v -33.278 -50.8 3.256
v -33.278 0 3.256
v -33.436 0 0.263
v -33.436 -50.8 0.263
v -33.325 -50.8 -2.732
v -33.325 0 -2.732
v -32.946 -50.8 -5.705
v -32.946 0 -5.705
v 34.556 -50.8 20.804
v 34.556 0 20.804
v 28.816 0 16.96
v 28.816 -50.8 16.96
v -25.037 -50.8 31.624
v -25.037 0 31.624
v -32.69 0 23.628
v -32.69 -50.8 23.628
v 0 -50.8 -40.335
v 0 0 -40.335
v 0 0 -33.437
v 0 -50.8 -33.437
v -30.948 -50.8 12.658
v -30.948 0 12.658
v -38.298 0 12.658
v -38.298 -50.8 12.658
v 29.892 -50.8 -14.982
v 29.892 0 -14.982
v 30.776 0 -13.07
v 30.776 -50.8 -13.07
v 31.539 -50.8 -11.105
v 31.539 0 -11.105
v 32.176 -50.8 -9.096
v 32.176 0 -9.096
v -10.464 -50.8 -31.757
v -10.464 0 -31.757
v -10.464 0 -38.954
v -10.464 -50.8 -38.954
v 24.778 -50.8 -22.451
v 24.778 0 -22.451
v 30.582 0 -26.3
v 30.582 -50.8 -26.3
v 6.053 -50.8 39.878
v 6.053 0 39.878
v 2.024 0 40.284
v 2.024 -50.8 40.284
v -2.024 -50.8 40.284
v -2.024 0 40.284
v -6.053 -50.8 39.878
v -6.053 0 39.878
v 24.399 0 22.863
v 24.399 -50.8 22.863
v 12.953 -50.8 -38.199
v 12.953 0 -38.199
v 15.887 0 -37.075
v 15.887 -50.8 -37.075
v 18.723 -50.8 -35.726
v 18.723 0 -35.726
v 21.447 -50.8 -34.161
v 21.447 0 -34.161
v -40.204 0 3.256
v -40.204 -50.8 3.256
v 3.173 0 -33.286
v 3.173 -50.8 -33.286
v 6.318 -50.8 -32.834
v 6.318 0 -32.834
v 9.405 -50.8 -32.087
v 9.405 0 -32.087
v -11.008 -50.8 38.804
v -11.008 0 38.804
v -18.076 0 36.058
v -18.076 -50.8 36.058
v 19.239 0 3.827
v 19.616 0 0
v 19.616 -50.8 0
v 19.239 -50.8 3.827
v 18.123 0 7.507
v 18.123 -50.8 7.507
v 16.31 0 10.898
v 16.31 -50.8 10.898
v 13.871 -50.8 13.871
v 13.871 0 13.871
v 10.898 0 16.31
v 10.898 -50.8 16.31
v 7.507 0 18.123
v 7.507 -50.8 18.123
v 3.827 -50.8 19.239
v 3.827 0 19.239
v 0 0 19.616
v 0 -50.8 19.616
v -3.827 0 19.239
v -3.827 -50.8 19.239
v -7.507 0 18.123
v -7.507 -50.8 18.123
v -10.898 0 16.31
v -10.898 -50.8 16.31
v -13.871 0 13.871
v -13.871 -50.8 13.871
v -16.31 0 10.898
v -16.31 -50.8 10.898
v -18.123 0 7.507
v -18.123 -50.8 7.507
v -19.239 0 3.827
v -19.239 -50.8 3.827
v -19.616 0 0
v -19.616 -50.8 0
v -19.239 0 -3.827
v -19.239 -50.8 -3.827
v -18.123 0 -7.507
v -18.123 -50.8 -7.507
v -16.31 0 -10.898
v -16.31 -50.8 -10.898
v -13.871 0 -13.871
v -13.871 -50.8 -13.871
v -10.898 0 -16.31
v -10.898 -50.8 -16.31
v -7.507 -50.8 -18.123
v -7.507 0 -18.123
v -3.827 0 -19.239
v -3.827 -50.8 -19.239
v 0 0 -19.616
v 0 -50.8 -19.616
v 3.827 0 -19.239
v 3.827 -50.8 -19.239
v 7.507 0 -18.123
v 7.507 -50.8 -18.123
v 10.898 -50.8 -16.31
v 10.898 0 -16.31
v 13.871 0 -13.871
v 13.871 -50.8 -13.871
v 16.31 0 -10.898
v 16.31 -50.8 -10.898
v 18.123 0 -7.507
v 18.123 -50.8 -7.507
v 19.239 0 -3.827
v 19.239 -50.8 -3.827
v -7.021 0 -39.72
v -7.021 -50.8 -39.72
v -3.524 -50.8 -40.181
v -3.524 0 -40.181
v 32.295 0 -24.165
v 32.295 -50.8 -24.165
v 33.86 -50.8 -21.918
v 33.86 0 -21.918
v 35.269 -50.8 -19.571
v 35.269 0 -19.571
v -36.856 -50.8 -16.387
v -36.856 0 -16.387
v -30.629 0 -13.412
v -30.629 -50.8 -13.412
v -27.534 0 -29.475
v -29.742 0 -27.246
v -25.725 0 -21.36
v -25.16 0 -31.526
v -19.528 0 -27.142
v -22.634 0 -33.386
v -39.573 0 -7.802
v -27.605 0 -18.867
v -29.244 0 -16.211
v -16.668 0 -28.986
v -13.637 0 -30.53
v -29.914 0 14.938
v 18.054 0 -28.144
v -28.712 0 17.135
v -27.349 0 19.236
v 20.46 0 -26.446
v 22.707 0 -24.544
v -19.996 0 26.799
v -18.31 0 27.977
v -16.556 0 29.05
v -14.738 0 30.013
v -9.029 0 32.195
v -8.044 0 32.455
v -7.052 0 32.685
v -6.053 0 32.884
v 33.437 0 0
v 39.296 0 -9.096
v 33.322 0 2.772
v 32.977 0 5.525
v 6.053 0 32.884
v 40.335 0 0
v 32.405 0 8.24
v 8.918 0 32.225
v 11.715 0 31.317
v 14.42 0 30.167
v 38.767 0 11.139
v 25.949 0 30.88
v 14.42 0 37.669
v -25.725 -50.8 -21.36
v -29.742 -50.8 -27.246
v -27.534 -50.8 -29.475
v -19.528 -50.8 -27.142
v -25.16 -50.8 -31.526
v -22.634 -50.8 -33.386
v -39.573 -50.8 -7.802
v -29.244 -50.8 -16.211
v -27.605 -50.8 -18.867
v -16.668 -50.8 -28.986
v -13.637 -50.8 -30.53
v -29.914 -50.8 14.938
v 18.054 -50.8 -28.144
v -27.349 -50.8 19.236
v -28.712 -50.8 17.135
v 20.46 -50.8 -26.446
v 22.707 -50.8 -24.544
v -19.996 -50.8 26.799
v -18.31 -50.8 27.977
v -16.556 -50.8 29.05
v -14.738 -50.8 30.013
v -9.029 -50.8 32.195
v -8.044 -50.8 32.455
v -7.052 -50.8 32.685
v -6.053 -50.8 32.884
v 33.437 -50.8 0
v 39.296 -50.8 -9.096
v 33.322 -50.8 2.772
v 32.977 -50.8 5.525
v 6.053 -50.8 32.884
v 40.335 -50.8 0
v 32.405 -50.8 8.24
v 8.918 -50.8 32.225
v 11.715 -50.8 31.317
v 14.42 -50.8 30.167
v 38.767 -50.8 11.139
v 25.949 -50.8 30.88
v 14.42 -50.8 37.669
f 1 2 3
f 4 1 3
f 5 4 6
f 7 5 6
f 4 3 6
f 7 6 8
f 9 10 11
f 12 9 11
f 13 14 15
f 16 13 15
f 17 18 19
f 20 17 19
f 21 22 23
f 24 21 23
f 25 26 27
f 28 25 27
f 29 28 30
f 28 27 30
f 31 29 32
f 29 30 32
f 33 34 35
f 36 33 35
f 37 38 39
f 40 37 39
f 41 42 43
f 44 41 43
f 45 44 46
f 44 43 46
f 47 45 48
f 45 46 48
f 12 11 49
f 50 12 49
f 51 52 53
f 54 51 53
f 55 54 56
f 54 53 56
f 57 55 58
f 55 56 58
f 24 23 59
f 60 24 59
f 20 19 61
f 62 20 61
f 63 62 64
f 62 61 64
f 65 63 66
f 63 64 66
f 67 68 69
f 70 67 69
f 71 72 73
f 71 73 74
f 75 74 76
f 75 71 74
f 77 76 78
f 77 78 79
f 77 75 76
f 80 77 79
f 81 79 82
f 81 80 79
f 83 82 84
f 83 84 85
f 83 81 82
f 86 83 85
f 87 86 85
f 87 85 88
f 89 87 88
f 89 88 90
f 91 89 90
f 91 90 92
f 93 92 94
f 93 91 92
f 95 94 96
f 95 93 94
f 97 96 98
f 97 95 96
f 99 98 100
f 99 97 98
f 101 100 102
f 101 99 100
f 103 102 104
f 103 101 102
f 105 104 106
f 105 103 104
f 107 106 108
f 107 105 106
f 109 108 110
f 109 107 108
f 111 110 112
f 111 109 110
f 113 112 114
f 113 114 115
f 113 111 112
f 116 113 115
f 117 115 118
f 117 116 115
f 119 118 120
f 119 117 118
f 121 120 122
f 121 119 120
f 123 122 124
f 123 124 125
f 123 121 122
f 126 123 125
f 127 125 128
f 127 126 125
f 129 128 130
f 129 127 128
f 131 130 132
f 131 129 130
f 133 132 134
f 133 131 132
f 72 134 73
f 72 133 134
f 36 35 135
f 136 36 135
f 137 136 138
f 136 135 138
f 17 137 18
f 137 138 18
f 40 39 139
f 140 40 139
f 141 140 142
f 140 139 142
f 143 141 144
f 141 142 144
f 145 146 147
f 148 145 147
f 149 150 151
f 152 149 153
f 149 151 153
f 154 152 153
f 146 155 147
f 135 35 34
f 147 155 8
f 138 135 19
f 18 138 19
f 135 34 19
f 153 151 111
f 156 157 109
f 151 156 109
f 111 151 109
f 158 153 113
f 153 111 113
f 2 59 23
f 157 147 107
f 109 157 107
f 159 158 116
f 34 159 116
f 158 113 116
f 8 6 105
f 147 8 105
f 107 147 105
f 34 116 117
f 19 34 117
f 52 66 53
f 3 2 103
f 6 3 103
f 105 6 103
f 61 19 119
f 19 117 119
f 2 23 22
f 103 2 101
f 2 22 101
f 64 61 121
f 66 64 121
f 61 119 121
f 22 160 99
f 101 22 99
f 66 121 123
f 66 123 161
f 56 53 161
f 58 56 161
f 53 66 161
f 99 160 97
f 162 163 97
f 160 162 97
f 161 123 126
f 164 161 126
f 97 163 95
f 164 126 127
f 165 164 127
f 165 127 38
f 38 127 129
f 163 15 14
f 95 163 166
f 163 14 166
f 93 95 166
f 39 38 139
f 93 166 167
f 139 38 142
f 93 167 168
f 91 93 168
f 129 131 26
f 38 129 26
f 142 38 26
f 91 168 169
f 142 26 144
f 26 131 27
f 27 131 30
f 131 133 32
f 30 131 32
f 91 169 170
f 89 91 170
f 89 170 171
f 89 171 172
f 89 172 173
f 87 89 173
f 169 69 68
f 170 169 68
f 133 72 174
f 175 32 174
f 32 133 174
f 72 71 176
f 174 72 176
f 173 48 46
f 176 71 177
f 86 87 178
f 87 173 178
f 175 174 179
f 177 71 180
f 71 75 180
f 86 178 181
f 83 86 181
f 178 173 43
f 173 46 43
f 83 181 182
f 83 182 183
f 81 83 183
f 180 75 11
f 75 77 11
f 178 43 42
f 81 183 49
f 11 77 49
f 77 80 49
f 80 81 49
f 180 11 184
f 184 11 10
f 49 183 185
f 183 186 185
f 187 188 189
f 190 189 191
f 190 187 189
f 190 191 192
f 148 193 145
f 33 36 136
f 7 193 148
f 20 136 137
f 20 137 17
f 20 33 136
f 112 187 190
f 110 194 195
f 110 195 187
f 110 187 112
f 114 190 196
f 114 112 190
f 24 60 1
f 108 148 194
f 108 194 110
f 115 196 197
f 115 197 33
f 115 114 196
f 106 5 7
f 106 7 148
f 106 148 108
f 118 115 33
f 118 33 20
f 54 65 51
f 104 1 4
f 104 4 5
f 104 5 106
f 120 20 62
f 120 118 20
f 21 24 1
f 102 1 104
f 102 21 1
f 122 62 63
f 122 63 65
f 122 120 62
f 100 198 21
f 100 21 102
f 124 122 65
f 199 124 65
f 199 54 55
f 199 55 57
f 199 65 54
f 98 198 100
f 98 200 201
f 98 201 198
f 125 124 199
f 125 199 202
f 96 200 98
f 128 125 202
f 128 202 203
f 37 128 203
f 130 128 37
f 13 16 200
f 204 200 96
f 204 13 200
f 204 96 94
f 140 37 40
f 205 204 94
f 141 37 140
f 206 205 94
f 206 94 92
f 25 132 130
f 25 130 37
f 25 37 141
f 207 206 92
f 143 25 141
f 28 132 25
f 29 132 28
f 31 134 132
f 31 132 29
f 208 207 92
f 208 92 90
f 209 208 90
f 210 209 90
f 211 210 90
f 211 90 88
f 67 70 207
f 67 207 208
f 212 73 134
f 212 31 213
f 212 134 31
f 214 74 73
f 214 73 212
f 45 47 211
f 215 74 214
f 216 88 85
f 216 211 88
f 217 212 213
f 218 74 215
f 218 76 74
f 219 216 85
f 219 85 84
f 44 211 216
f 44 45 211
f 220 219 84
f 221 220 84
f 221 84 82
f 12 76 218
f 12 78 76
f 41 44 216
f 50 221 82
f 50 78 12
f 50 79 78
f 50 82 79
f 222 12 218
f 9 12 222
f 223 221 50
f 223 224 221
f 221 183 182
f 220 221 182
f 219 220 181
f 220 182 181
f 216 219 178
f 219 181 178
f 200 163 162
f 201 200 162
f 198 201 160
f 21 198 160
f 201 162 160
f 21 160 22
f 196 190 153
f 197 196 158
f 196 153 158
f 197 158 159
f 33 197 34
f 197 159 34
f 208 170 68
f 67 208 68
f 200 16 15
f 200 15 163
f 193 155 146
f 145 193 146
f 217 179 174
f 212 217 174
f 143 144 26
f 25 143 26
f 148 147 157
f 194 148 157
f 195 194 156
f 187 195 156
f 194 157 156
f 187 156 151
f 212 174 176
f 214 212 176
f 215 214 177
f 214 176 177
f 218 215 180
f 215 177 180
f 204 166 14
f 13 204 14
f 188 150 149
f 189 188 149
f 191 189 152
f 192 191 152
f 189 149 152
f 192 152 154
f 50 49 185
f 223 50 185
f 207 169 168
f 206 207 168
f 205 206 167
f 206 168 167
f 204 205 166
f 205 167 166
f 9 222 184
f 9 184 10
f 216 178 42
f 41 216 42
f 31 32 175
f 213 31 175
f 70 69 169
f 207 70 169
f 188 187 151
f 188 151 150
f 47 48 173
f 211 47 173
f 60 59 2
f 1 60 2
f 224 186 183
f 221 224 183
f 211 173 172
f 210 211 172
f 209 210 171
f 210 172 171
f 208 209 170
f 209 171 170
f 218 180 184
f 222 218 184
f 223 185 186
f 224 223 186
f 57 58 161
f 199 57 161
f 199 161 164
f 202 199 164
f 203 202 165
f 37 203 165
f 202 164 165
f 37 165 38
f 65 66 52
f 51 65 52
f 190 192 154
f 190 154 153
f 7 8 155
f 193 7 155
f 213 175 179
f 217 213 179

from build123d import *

# Parameters (mm, degrees)
F0_R     = 19.61617
F1_DEPTH = 50.8


with BuildPart() as f1:
    # F0 (on Front) → F1 (new body)
    with BuildSketch(Plane.XZ):
        with BuildLine():
            Line((-6.052636, 39.878492), (-6.052636, 32.884275))
            ThreePointArc((-6.052636, 32.884275), (-7.548644, 32.573424), (-9.028888, 32.194551))
            Line((-9.028888, 32.194551), (-11.007963, 38.804037))
            Line((-11.007963, 38.804037), (-18.076009, 36.058098))
            Line((-18.076009, 36.058098), (-14.738214, 30.013247))
            ThreePointArc((-14.738214, 30.013247), (-17.441313, 28.527365), (-19.995981, 26.798707))
            Line((-19.995981, 26.798707), (-25.037277, 31.623777))
            Line((-25.037277, 31.623777), (-32.690295, 23.627805))
            Line((-32.690295, 23.627805), (-27.349421, 19.235881))
            ThreePointArc((-27.349421, 19.235881), (-29.333744, 16.048096), (-30.948132, 12.657925))
            Line((-30.948132, 12.657925), (-38.297591, 12.657925))
            Line((-38.297591, 12.657925), (-40.203536, 3.256409))
            Line((-40.203536, 3.256409), (-33.277707, 3.256409))
            ThreePointArc((-33.277707, 3.256409), (-33.413831, -1.235271), (-32.946427, -5.704638))
            Line((-32.946427, -5.704638), (-39.573435, -7.802038))
            Line((-39.573435, -7.802038), (-36.856234, -16.387391))
            Line((-36.856234, -16.387391), (-30.628721, -13.41236))
            ThreePointArc((-30.628721, -13.41236), (-28.455593, -17.558165), (-25.724808, -21.359874))
            Line((-25.724808, -21.359874), (-29.741899, -27.246063))
            ThreePointArc((-29.741899, -27.246063), (-26.367109, -30.523829), (-22.633617, -33.386343))
            Line((-22.633617, -33.386343), (-19.527745, -27.141797))
            ThreePointArc((-19.527745, -27.141797), (-15.172234, -29.796196), (-10.463662, -31.757231))
            Line((-10.463662, -31.757231), (-10.463662, -38.954336))
            ThreePointArc((-10.463662, -38.954336), (-5.277192, -39.988496), (0, -40.335202))
            Line((0, -40.335202), (0, -33.436656))
            ThreePointArc((0, -33.436656), (4.750751, -33.097437), (9.405108, -32.086663))
            Line((9.405108, -32.086663), (12.953476, -38.198639))
            ThreePointArc((12.953476, -38.198639), (17.318161, -36.428147), (21.446691, -34.160913))
            Line((21.446691, -34.160913), (18.053638, -28.143847))
            ThreePointArc((18.053638, -28.143847), (21.60412, -25.52003), (24.777977, -22.451321))
            Line((24.777977, -22.451321), (30.581673, -26.299997))
            ThreePointArc((30.581673, -26.299997), (33.096887, -23.054818), (35.269166, -19.570756))
            Line((35.269166, -19.570756), (29.892103, -14.982395))
            ThreePointArc((29.892103, -14.982395), (31.173038, -12.093454), (32.175517, -9.096488))
            Line((32.175517, -9.096488), (39.296087, -9.096488))
            Line((39.296087, -9.096488), (40.335202, 0))
            Line((40.335202, 0), (33.436656, 0))
            ThreePointArc((33.436656, 0), (33.177826, 4.152331), (32.405342, 8.240376))
            Line((32.405342, 8.240376), (38.766721, 11.138667))
            Line((38.766721, 11.138667), (34.556119, 20.803923))
            Line((34.556119, 20.803923), (28.816288, 16.959703))
            Line((28.816288, 16.959703), (24.398983, 22.862625))
            Line((24.398983, 22.862625), (25.948878, 30.88016))
            Line((25.948878, 30.88016), (14.420494, 37.669323))
            Line((14.420494, 37.669323), (14.420494, 30.167189))
            ThreePointArc((14.420494, 30.167189), (10.326321, 31.802155), (6.052636, 32.884275))
            Line((6.052636, 32.884275), (6.052636, 39.878492))
            ThreePointArc((6.052636, 39.878492), (0, 40.335202), (-6.052636, 39.878492))
        make_face()
        Circle(F0_R, mode=Mode.SUBTRACT)
    extrude(amount=F1_DEPTH)


solid = f1.part
